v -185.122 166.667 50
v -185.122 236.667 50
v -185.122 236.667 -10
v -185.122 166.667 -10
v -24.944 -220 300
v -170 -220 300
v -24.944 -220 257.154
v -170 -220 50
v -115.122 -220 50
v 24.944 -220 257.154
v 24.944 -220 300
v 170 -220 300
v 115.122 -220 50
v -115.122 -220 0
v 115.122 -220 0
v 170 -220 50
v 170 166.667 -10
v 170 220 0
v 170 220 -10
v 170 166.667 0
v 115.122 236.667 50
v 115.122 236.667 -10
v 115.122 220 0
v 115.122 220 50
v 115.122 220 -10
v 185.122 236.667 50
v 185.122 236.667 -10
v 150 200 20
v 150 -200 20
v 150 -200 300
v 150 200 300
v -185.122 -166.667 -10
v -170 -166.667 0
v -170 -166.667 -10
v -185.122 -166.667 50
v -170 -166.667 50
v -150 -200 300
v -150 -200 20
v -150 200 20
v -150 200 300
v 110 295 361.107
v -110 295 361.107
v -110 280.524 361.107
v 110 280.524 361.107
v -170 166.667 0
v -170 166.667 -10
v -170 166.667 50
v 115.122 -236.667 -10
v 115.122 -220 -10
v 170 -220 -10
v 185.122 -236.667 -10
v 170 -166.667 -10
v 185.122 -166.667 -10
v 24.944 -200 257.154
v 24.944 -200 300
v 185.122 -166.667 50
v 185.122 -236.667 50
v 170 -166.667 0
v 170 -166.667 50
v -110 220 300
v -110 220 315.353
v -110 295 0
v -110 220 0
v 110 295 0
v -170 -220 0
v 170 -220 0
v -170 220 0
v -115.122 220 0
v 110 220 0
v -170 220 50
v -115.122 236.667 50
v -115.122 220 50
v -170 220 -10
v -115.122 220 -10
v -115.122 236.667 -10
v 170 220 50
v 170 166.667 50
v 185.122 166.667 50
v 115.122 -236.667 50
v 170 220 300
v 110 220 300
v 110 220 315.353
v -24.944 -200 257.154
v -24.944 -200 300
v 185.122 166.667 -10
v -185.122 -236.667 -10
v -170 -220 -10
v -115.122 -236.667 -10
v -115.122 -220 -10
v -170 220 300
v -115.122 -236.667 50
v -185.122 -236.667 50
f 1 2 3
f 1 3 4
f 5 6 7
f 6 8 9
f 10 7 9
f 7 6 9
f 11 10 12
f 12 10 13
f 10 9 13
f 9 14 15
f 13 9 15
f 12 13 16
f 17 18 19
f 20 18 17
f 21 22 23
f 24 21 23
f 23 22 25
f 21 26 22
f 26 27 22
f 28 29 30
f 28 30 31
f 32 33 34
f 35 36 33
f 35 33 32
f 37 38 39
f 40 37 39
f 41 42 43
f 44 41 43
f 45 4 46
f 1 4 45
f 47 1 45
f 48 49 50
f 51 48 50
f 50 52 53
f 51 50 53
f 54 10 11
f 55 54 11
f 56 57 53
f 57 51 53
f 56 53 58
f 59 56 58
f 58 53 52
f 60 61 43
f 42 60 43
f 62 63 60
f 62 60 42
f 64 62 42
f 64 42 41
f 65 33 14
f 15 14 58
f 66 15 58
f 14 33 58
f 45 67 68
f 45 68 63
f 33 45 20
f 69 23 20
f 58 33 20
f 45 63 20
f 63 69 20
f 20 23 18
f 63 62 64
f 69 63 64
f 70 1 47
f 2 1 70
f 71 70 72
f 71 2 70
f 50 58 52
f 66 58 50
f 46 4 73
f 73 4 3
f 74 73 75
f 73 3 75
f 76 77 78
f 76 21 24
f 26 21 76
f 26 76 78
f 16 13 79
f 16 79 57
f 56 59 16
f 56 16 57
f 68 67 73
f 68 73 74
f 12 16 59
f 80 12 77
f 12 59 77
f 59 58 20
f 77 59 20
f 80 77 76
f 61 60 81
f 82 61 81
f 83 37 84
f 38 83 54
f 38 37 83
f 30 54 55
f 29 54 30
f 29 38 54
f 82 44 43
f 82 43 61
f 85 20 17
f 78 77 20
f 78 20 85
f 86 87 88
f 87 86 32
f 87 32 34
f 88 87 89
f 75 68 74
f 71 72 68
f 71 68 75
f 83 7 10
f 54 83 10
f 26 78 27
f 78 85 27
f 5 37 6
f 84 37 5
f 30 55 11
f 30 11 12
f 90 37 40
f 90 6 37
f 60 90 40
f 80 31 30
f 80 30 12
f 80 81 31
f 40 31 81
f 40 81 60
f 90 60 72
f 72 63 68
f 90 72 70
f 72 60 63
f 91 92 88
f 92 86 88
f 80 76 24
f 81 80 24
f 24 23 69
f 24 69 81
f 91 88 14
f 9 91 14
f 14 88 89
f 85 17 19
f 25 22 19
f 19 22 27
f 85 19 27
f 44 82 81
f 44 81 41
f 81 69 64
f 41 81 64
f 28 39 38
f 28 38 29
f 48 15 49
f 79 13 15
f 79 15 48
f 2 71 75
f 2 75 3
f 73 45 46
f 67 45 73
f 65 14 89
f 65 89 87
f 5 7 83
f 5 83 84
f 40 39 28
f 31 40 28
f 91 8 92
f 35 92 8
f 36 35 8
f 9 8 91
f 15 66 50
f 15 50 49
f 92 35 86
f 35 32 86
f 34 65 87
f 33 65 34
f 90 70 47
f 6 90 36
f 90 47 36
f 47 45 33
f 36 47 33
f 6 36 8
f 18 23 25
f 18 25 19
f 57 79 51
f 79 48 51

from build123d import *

# Parameters (mm, degrees)
F0_W          = 300
F0_H          = 400
F1_DEPTH      = 300
F0_W_2        = 220
F0_H_2        = 75
F2_DEPTH      = 400
F3_DEPTH      = 300
F4_DEPTH      = 20
F6_DEPTH      = 220
F7_W          = 49.88788
F7_H          = 42.84564
F8_DEPTH      = 20
F9_DEPTH      = 50
F9_DEPTH_BACK = 10


with BuildPart() as f1:
    # F0 (on Top) → F1 (new body)
    with BuildSketch(Plane.XY):
        Rectangle(F0_W, F0_H)
        Polygon((170, 166.666694), (170, 220), (115.122088, 220), (110, 220), (-110, 220), (-115.122088, 220), (-170, 220), (-170, 166.666694), (-170, -166.666694), (-170, -220), (-115.122088, -220), (115.122088, -220), (170, -220), (170, -166.666694), align=None)
        Rectangle(F0_W, F0_H, mode=Mode.SUBTRACT)
    extrude(amount=F1_DEPTH)

    # F0 (on Top) → F2 (join)
    with BuildSketch(Plane.XY):
        with Locations((0, 257.5)):
            Rectangle(F0_W_2, F0_H_2)
    extrude(amount=F2_DEPTH)

    # F0 (on Top) → F3 (cut)
    with BuildSketch(Plane.XY):
        Rectangle(F0_W, F0_H)
    extrude(amount=F3_DEPTH, mode=Mode.SUBTRACT)

    # F0 (on Top) → F4 (join)
    with BuildSketch(Plane.XY):
        Rectangle(F0_W, F0_H)
    extrude(amount=F4_DEPTH)

    # F5 (on face) → F6 (cut, through all)
    with BuildSketch(Plane(origin=(-110, 0, 0), x_dir=(0, -1, 0), z_dir=(-1, 0, 0))):
        Polygon((-295, 400), (-295, 361.107111), (-280.523896, 361.107111), (-220, 315.353394), (-220, 400), align=None)
    extrude(amount=-F6_DEPTH, mode=Mode.SUBTRACT)

    # F7 (on face) → F8 (cut, through all)
    with BuildSketch(Plane.XZ.offset(220)):
        with Locations((0, 278.57718)):
            Rectangle(F7_W, F7_H)
    extrude(amount=-F8_DEPTH, mode=Mode.SUBTRACT)

    # F0 (on Top) → F9 (join, two sides)
    with BuildSketch(Plane.XY) as f9_sk:
        Polygon((-170, 220), (-115.122088, 220), (-115.122088, 236.666694), (-185.122088, 236.666694), (-185.122088, 166.666694), (-170, 166.666694), align=None)
        Polygon((-115.122088, -236.666694), (-115.122088, -220), (-170, -220), (-170, -166.666694), (-185.122088, -166.666694), (-185.122088, -236.666694), align=None)
        Polygon((185.122088, -166.666694), (170, -166.666694), (170, -220), (115.122088, -220), (115.122088, -236.666694), (185.122088, -236.666694), align=None)
        Polygon((115.122088, 220), (170, 220), (170, 166.666694), (185.122088, 166.666694), (185.122088, 236.666694), (115.122088, 236.666694), align=None)
    extrude(amount=F9_DEPTH)
    extrude(f9_sk.sketch, amount=-F9_DEPTH_BACK)


solid = f1.part
